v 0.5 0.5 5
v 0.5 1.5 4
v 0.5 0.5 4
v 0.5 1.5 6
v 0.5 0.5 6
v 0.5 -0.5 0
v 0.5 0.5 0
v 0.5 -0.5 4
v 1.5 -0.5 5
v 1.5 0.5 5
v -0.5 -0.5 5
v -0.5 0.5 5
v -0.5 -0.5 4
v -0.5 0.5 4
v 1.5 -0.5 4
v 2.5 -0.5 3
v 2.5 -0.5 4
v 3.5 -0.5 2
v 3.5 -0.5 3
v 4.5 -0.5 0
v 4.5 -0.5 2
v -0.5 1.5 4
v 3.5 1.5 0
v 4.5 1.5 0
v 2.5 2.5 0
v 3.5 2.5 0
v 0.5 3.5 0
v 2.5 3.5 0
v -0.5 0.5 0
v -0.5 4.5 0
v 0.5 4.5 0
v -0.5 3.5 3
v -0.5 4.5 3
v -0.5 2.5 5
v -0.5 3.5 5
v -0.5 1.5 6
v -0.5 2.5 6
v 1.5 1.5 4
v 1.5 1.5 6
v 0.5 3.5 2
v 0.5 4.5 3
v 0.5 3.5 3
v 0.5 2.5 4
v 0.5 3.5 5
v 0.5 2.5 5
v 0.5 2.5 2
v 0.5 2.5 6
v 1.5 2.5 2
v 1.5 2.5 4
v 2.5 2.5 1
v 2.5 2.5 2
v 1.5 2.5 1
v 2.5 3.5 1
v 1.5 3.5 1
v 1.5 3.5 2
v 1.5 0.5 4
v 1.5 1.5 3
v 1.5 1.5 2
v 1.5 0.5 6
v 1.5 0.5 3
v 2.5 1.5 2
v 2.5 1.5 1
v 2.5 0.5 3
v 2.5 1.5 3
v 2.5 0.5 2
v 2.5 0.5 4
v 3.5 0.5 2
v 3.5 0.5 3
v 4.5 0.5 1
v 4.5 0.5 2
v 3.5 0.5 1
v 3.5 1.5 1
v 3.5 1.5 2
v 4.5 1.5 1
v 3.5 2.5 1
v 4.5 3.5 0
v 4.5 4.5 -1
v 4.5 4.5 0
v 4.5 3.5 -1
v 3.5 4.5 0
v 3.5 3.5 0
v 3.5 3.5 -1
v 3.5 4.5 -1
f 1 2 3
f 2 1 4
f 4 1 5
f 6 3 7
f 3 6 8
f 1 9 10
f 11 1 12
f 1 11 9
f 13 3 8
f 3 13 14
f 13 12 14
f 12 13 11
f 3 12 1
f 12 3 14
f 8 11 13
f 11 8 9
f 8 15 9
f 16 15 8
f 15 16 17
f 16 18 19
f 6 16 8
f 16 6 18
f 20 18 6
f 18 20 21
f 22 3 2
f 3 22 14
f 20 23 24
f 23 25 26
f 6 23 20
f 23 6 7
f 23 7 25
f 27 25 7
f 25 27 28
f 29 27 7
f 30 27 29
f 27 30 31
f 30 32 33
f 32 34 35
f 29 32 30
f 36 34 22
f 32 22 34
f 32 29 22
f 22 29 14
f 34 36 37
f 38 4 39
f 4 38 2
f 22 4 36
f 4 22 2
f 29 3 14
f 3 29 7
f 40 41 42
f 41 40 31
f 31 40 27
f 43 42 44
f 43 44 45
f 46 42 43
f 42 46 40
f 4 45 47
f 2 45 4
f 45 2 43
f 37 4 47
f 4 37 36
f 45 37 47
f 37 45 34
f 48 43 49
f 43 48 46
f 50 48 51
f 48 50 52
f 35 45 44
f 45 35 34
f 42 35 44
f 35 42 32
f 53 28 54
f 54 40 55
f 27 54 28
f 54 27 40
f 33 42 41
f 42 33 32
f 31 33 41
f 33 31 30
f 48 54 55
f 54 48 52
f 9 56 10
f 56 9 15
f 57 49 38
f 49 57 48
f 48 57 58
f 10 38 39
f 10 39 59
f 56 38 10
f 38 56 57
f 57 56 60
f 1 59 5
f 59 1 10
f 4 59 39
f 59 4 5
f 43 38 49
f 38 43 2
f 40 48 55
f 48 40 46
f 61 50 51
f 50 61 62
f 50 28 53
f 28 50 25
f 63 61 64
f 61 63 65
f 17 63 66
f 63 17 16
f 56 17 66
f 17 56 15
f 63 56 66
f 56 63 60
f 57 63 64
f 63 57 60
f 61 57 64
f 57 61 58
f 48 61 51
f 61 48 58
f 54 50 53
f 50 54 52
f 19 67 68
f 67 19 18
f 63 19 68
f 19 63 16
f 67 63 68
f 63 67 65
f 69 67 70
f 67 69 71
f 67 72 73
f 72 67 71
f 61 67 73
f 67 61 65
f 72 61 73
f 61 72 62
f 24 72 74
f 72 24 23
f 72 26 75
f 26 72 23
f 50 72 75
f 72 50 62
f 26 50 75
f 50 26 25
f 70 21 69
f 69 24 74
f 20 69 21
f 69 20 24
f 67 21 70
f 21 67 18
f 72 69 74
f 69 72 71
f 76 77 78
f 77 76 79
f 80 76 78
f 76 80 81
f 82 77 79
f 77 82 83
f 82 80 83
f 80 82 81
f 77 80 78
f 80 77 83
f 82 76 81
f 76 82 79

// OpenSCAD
union() {
    translate([0, 0, 4.5]) color([1, 0, 0]) cube([1, 1, 1], center=true);
    translate([0, 1, 2.0]) cube([1, 1, 4], center=true);
    translate([0, 2, 3.0]) cube([1, 1, 6], center=true);
    translate([0, 3, 2.5]) cube([1, 1, 5], center=true);
    translate([0, 4, 1.5]) cube([1, 1, 3], center=true);
    translate([1, 0, 2.5]) cube([1, 1, 5], center=true);
    translate([1, 1, 3.0]) cube([1, 1, 6], center=true);
    translate([1, 2, 2.0]) cube([1, 1, 4], center=true);
    translate([1, 3, 1.0]) cube([1, 1, 2], center=true);
    translate([2, 0, 2.0]) cube([1, 1, 4], center=true);
    translate([2, 1, 1.5]) cube([1, 1, 3], center=true);
    translate([2, 2, 1.0]) cube([1, 1, 2], center=true);
    translate([2, 3, 0.5]) cube([1, 1, 1], center=true);
    translate([3, 0, 1.5]) cube([1, 1, 3], center=true);
    translate([3, 1, 1.0]) cube([1, 1, 2], center=true);
    translate([3, 2, 0.5]) cube([1, 1, 1], center=true);
    translate([4, 0, 1.0]) cube([1, 1, 2], center=true);
    translate([4, 1, 0.5]) cube([1, 1, 1], center=true);
    translate([4, 4, -0.5]) color([0, 0, 1]) cube([1, 1, 1], center=true);
}
